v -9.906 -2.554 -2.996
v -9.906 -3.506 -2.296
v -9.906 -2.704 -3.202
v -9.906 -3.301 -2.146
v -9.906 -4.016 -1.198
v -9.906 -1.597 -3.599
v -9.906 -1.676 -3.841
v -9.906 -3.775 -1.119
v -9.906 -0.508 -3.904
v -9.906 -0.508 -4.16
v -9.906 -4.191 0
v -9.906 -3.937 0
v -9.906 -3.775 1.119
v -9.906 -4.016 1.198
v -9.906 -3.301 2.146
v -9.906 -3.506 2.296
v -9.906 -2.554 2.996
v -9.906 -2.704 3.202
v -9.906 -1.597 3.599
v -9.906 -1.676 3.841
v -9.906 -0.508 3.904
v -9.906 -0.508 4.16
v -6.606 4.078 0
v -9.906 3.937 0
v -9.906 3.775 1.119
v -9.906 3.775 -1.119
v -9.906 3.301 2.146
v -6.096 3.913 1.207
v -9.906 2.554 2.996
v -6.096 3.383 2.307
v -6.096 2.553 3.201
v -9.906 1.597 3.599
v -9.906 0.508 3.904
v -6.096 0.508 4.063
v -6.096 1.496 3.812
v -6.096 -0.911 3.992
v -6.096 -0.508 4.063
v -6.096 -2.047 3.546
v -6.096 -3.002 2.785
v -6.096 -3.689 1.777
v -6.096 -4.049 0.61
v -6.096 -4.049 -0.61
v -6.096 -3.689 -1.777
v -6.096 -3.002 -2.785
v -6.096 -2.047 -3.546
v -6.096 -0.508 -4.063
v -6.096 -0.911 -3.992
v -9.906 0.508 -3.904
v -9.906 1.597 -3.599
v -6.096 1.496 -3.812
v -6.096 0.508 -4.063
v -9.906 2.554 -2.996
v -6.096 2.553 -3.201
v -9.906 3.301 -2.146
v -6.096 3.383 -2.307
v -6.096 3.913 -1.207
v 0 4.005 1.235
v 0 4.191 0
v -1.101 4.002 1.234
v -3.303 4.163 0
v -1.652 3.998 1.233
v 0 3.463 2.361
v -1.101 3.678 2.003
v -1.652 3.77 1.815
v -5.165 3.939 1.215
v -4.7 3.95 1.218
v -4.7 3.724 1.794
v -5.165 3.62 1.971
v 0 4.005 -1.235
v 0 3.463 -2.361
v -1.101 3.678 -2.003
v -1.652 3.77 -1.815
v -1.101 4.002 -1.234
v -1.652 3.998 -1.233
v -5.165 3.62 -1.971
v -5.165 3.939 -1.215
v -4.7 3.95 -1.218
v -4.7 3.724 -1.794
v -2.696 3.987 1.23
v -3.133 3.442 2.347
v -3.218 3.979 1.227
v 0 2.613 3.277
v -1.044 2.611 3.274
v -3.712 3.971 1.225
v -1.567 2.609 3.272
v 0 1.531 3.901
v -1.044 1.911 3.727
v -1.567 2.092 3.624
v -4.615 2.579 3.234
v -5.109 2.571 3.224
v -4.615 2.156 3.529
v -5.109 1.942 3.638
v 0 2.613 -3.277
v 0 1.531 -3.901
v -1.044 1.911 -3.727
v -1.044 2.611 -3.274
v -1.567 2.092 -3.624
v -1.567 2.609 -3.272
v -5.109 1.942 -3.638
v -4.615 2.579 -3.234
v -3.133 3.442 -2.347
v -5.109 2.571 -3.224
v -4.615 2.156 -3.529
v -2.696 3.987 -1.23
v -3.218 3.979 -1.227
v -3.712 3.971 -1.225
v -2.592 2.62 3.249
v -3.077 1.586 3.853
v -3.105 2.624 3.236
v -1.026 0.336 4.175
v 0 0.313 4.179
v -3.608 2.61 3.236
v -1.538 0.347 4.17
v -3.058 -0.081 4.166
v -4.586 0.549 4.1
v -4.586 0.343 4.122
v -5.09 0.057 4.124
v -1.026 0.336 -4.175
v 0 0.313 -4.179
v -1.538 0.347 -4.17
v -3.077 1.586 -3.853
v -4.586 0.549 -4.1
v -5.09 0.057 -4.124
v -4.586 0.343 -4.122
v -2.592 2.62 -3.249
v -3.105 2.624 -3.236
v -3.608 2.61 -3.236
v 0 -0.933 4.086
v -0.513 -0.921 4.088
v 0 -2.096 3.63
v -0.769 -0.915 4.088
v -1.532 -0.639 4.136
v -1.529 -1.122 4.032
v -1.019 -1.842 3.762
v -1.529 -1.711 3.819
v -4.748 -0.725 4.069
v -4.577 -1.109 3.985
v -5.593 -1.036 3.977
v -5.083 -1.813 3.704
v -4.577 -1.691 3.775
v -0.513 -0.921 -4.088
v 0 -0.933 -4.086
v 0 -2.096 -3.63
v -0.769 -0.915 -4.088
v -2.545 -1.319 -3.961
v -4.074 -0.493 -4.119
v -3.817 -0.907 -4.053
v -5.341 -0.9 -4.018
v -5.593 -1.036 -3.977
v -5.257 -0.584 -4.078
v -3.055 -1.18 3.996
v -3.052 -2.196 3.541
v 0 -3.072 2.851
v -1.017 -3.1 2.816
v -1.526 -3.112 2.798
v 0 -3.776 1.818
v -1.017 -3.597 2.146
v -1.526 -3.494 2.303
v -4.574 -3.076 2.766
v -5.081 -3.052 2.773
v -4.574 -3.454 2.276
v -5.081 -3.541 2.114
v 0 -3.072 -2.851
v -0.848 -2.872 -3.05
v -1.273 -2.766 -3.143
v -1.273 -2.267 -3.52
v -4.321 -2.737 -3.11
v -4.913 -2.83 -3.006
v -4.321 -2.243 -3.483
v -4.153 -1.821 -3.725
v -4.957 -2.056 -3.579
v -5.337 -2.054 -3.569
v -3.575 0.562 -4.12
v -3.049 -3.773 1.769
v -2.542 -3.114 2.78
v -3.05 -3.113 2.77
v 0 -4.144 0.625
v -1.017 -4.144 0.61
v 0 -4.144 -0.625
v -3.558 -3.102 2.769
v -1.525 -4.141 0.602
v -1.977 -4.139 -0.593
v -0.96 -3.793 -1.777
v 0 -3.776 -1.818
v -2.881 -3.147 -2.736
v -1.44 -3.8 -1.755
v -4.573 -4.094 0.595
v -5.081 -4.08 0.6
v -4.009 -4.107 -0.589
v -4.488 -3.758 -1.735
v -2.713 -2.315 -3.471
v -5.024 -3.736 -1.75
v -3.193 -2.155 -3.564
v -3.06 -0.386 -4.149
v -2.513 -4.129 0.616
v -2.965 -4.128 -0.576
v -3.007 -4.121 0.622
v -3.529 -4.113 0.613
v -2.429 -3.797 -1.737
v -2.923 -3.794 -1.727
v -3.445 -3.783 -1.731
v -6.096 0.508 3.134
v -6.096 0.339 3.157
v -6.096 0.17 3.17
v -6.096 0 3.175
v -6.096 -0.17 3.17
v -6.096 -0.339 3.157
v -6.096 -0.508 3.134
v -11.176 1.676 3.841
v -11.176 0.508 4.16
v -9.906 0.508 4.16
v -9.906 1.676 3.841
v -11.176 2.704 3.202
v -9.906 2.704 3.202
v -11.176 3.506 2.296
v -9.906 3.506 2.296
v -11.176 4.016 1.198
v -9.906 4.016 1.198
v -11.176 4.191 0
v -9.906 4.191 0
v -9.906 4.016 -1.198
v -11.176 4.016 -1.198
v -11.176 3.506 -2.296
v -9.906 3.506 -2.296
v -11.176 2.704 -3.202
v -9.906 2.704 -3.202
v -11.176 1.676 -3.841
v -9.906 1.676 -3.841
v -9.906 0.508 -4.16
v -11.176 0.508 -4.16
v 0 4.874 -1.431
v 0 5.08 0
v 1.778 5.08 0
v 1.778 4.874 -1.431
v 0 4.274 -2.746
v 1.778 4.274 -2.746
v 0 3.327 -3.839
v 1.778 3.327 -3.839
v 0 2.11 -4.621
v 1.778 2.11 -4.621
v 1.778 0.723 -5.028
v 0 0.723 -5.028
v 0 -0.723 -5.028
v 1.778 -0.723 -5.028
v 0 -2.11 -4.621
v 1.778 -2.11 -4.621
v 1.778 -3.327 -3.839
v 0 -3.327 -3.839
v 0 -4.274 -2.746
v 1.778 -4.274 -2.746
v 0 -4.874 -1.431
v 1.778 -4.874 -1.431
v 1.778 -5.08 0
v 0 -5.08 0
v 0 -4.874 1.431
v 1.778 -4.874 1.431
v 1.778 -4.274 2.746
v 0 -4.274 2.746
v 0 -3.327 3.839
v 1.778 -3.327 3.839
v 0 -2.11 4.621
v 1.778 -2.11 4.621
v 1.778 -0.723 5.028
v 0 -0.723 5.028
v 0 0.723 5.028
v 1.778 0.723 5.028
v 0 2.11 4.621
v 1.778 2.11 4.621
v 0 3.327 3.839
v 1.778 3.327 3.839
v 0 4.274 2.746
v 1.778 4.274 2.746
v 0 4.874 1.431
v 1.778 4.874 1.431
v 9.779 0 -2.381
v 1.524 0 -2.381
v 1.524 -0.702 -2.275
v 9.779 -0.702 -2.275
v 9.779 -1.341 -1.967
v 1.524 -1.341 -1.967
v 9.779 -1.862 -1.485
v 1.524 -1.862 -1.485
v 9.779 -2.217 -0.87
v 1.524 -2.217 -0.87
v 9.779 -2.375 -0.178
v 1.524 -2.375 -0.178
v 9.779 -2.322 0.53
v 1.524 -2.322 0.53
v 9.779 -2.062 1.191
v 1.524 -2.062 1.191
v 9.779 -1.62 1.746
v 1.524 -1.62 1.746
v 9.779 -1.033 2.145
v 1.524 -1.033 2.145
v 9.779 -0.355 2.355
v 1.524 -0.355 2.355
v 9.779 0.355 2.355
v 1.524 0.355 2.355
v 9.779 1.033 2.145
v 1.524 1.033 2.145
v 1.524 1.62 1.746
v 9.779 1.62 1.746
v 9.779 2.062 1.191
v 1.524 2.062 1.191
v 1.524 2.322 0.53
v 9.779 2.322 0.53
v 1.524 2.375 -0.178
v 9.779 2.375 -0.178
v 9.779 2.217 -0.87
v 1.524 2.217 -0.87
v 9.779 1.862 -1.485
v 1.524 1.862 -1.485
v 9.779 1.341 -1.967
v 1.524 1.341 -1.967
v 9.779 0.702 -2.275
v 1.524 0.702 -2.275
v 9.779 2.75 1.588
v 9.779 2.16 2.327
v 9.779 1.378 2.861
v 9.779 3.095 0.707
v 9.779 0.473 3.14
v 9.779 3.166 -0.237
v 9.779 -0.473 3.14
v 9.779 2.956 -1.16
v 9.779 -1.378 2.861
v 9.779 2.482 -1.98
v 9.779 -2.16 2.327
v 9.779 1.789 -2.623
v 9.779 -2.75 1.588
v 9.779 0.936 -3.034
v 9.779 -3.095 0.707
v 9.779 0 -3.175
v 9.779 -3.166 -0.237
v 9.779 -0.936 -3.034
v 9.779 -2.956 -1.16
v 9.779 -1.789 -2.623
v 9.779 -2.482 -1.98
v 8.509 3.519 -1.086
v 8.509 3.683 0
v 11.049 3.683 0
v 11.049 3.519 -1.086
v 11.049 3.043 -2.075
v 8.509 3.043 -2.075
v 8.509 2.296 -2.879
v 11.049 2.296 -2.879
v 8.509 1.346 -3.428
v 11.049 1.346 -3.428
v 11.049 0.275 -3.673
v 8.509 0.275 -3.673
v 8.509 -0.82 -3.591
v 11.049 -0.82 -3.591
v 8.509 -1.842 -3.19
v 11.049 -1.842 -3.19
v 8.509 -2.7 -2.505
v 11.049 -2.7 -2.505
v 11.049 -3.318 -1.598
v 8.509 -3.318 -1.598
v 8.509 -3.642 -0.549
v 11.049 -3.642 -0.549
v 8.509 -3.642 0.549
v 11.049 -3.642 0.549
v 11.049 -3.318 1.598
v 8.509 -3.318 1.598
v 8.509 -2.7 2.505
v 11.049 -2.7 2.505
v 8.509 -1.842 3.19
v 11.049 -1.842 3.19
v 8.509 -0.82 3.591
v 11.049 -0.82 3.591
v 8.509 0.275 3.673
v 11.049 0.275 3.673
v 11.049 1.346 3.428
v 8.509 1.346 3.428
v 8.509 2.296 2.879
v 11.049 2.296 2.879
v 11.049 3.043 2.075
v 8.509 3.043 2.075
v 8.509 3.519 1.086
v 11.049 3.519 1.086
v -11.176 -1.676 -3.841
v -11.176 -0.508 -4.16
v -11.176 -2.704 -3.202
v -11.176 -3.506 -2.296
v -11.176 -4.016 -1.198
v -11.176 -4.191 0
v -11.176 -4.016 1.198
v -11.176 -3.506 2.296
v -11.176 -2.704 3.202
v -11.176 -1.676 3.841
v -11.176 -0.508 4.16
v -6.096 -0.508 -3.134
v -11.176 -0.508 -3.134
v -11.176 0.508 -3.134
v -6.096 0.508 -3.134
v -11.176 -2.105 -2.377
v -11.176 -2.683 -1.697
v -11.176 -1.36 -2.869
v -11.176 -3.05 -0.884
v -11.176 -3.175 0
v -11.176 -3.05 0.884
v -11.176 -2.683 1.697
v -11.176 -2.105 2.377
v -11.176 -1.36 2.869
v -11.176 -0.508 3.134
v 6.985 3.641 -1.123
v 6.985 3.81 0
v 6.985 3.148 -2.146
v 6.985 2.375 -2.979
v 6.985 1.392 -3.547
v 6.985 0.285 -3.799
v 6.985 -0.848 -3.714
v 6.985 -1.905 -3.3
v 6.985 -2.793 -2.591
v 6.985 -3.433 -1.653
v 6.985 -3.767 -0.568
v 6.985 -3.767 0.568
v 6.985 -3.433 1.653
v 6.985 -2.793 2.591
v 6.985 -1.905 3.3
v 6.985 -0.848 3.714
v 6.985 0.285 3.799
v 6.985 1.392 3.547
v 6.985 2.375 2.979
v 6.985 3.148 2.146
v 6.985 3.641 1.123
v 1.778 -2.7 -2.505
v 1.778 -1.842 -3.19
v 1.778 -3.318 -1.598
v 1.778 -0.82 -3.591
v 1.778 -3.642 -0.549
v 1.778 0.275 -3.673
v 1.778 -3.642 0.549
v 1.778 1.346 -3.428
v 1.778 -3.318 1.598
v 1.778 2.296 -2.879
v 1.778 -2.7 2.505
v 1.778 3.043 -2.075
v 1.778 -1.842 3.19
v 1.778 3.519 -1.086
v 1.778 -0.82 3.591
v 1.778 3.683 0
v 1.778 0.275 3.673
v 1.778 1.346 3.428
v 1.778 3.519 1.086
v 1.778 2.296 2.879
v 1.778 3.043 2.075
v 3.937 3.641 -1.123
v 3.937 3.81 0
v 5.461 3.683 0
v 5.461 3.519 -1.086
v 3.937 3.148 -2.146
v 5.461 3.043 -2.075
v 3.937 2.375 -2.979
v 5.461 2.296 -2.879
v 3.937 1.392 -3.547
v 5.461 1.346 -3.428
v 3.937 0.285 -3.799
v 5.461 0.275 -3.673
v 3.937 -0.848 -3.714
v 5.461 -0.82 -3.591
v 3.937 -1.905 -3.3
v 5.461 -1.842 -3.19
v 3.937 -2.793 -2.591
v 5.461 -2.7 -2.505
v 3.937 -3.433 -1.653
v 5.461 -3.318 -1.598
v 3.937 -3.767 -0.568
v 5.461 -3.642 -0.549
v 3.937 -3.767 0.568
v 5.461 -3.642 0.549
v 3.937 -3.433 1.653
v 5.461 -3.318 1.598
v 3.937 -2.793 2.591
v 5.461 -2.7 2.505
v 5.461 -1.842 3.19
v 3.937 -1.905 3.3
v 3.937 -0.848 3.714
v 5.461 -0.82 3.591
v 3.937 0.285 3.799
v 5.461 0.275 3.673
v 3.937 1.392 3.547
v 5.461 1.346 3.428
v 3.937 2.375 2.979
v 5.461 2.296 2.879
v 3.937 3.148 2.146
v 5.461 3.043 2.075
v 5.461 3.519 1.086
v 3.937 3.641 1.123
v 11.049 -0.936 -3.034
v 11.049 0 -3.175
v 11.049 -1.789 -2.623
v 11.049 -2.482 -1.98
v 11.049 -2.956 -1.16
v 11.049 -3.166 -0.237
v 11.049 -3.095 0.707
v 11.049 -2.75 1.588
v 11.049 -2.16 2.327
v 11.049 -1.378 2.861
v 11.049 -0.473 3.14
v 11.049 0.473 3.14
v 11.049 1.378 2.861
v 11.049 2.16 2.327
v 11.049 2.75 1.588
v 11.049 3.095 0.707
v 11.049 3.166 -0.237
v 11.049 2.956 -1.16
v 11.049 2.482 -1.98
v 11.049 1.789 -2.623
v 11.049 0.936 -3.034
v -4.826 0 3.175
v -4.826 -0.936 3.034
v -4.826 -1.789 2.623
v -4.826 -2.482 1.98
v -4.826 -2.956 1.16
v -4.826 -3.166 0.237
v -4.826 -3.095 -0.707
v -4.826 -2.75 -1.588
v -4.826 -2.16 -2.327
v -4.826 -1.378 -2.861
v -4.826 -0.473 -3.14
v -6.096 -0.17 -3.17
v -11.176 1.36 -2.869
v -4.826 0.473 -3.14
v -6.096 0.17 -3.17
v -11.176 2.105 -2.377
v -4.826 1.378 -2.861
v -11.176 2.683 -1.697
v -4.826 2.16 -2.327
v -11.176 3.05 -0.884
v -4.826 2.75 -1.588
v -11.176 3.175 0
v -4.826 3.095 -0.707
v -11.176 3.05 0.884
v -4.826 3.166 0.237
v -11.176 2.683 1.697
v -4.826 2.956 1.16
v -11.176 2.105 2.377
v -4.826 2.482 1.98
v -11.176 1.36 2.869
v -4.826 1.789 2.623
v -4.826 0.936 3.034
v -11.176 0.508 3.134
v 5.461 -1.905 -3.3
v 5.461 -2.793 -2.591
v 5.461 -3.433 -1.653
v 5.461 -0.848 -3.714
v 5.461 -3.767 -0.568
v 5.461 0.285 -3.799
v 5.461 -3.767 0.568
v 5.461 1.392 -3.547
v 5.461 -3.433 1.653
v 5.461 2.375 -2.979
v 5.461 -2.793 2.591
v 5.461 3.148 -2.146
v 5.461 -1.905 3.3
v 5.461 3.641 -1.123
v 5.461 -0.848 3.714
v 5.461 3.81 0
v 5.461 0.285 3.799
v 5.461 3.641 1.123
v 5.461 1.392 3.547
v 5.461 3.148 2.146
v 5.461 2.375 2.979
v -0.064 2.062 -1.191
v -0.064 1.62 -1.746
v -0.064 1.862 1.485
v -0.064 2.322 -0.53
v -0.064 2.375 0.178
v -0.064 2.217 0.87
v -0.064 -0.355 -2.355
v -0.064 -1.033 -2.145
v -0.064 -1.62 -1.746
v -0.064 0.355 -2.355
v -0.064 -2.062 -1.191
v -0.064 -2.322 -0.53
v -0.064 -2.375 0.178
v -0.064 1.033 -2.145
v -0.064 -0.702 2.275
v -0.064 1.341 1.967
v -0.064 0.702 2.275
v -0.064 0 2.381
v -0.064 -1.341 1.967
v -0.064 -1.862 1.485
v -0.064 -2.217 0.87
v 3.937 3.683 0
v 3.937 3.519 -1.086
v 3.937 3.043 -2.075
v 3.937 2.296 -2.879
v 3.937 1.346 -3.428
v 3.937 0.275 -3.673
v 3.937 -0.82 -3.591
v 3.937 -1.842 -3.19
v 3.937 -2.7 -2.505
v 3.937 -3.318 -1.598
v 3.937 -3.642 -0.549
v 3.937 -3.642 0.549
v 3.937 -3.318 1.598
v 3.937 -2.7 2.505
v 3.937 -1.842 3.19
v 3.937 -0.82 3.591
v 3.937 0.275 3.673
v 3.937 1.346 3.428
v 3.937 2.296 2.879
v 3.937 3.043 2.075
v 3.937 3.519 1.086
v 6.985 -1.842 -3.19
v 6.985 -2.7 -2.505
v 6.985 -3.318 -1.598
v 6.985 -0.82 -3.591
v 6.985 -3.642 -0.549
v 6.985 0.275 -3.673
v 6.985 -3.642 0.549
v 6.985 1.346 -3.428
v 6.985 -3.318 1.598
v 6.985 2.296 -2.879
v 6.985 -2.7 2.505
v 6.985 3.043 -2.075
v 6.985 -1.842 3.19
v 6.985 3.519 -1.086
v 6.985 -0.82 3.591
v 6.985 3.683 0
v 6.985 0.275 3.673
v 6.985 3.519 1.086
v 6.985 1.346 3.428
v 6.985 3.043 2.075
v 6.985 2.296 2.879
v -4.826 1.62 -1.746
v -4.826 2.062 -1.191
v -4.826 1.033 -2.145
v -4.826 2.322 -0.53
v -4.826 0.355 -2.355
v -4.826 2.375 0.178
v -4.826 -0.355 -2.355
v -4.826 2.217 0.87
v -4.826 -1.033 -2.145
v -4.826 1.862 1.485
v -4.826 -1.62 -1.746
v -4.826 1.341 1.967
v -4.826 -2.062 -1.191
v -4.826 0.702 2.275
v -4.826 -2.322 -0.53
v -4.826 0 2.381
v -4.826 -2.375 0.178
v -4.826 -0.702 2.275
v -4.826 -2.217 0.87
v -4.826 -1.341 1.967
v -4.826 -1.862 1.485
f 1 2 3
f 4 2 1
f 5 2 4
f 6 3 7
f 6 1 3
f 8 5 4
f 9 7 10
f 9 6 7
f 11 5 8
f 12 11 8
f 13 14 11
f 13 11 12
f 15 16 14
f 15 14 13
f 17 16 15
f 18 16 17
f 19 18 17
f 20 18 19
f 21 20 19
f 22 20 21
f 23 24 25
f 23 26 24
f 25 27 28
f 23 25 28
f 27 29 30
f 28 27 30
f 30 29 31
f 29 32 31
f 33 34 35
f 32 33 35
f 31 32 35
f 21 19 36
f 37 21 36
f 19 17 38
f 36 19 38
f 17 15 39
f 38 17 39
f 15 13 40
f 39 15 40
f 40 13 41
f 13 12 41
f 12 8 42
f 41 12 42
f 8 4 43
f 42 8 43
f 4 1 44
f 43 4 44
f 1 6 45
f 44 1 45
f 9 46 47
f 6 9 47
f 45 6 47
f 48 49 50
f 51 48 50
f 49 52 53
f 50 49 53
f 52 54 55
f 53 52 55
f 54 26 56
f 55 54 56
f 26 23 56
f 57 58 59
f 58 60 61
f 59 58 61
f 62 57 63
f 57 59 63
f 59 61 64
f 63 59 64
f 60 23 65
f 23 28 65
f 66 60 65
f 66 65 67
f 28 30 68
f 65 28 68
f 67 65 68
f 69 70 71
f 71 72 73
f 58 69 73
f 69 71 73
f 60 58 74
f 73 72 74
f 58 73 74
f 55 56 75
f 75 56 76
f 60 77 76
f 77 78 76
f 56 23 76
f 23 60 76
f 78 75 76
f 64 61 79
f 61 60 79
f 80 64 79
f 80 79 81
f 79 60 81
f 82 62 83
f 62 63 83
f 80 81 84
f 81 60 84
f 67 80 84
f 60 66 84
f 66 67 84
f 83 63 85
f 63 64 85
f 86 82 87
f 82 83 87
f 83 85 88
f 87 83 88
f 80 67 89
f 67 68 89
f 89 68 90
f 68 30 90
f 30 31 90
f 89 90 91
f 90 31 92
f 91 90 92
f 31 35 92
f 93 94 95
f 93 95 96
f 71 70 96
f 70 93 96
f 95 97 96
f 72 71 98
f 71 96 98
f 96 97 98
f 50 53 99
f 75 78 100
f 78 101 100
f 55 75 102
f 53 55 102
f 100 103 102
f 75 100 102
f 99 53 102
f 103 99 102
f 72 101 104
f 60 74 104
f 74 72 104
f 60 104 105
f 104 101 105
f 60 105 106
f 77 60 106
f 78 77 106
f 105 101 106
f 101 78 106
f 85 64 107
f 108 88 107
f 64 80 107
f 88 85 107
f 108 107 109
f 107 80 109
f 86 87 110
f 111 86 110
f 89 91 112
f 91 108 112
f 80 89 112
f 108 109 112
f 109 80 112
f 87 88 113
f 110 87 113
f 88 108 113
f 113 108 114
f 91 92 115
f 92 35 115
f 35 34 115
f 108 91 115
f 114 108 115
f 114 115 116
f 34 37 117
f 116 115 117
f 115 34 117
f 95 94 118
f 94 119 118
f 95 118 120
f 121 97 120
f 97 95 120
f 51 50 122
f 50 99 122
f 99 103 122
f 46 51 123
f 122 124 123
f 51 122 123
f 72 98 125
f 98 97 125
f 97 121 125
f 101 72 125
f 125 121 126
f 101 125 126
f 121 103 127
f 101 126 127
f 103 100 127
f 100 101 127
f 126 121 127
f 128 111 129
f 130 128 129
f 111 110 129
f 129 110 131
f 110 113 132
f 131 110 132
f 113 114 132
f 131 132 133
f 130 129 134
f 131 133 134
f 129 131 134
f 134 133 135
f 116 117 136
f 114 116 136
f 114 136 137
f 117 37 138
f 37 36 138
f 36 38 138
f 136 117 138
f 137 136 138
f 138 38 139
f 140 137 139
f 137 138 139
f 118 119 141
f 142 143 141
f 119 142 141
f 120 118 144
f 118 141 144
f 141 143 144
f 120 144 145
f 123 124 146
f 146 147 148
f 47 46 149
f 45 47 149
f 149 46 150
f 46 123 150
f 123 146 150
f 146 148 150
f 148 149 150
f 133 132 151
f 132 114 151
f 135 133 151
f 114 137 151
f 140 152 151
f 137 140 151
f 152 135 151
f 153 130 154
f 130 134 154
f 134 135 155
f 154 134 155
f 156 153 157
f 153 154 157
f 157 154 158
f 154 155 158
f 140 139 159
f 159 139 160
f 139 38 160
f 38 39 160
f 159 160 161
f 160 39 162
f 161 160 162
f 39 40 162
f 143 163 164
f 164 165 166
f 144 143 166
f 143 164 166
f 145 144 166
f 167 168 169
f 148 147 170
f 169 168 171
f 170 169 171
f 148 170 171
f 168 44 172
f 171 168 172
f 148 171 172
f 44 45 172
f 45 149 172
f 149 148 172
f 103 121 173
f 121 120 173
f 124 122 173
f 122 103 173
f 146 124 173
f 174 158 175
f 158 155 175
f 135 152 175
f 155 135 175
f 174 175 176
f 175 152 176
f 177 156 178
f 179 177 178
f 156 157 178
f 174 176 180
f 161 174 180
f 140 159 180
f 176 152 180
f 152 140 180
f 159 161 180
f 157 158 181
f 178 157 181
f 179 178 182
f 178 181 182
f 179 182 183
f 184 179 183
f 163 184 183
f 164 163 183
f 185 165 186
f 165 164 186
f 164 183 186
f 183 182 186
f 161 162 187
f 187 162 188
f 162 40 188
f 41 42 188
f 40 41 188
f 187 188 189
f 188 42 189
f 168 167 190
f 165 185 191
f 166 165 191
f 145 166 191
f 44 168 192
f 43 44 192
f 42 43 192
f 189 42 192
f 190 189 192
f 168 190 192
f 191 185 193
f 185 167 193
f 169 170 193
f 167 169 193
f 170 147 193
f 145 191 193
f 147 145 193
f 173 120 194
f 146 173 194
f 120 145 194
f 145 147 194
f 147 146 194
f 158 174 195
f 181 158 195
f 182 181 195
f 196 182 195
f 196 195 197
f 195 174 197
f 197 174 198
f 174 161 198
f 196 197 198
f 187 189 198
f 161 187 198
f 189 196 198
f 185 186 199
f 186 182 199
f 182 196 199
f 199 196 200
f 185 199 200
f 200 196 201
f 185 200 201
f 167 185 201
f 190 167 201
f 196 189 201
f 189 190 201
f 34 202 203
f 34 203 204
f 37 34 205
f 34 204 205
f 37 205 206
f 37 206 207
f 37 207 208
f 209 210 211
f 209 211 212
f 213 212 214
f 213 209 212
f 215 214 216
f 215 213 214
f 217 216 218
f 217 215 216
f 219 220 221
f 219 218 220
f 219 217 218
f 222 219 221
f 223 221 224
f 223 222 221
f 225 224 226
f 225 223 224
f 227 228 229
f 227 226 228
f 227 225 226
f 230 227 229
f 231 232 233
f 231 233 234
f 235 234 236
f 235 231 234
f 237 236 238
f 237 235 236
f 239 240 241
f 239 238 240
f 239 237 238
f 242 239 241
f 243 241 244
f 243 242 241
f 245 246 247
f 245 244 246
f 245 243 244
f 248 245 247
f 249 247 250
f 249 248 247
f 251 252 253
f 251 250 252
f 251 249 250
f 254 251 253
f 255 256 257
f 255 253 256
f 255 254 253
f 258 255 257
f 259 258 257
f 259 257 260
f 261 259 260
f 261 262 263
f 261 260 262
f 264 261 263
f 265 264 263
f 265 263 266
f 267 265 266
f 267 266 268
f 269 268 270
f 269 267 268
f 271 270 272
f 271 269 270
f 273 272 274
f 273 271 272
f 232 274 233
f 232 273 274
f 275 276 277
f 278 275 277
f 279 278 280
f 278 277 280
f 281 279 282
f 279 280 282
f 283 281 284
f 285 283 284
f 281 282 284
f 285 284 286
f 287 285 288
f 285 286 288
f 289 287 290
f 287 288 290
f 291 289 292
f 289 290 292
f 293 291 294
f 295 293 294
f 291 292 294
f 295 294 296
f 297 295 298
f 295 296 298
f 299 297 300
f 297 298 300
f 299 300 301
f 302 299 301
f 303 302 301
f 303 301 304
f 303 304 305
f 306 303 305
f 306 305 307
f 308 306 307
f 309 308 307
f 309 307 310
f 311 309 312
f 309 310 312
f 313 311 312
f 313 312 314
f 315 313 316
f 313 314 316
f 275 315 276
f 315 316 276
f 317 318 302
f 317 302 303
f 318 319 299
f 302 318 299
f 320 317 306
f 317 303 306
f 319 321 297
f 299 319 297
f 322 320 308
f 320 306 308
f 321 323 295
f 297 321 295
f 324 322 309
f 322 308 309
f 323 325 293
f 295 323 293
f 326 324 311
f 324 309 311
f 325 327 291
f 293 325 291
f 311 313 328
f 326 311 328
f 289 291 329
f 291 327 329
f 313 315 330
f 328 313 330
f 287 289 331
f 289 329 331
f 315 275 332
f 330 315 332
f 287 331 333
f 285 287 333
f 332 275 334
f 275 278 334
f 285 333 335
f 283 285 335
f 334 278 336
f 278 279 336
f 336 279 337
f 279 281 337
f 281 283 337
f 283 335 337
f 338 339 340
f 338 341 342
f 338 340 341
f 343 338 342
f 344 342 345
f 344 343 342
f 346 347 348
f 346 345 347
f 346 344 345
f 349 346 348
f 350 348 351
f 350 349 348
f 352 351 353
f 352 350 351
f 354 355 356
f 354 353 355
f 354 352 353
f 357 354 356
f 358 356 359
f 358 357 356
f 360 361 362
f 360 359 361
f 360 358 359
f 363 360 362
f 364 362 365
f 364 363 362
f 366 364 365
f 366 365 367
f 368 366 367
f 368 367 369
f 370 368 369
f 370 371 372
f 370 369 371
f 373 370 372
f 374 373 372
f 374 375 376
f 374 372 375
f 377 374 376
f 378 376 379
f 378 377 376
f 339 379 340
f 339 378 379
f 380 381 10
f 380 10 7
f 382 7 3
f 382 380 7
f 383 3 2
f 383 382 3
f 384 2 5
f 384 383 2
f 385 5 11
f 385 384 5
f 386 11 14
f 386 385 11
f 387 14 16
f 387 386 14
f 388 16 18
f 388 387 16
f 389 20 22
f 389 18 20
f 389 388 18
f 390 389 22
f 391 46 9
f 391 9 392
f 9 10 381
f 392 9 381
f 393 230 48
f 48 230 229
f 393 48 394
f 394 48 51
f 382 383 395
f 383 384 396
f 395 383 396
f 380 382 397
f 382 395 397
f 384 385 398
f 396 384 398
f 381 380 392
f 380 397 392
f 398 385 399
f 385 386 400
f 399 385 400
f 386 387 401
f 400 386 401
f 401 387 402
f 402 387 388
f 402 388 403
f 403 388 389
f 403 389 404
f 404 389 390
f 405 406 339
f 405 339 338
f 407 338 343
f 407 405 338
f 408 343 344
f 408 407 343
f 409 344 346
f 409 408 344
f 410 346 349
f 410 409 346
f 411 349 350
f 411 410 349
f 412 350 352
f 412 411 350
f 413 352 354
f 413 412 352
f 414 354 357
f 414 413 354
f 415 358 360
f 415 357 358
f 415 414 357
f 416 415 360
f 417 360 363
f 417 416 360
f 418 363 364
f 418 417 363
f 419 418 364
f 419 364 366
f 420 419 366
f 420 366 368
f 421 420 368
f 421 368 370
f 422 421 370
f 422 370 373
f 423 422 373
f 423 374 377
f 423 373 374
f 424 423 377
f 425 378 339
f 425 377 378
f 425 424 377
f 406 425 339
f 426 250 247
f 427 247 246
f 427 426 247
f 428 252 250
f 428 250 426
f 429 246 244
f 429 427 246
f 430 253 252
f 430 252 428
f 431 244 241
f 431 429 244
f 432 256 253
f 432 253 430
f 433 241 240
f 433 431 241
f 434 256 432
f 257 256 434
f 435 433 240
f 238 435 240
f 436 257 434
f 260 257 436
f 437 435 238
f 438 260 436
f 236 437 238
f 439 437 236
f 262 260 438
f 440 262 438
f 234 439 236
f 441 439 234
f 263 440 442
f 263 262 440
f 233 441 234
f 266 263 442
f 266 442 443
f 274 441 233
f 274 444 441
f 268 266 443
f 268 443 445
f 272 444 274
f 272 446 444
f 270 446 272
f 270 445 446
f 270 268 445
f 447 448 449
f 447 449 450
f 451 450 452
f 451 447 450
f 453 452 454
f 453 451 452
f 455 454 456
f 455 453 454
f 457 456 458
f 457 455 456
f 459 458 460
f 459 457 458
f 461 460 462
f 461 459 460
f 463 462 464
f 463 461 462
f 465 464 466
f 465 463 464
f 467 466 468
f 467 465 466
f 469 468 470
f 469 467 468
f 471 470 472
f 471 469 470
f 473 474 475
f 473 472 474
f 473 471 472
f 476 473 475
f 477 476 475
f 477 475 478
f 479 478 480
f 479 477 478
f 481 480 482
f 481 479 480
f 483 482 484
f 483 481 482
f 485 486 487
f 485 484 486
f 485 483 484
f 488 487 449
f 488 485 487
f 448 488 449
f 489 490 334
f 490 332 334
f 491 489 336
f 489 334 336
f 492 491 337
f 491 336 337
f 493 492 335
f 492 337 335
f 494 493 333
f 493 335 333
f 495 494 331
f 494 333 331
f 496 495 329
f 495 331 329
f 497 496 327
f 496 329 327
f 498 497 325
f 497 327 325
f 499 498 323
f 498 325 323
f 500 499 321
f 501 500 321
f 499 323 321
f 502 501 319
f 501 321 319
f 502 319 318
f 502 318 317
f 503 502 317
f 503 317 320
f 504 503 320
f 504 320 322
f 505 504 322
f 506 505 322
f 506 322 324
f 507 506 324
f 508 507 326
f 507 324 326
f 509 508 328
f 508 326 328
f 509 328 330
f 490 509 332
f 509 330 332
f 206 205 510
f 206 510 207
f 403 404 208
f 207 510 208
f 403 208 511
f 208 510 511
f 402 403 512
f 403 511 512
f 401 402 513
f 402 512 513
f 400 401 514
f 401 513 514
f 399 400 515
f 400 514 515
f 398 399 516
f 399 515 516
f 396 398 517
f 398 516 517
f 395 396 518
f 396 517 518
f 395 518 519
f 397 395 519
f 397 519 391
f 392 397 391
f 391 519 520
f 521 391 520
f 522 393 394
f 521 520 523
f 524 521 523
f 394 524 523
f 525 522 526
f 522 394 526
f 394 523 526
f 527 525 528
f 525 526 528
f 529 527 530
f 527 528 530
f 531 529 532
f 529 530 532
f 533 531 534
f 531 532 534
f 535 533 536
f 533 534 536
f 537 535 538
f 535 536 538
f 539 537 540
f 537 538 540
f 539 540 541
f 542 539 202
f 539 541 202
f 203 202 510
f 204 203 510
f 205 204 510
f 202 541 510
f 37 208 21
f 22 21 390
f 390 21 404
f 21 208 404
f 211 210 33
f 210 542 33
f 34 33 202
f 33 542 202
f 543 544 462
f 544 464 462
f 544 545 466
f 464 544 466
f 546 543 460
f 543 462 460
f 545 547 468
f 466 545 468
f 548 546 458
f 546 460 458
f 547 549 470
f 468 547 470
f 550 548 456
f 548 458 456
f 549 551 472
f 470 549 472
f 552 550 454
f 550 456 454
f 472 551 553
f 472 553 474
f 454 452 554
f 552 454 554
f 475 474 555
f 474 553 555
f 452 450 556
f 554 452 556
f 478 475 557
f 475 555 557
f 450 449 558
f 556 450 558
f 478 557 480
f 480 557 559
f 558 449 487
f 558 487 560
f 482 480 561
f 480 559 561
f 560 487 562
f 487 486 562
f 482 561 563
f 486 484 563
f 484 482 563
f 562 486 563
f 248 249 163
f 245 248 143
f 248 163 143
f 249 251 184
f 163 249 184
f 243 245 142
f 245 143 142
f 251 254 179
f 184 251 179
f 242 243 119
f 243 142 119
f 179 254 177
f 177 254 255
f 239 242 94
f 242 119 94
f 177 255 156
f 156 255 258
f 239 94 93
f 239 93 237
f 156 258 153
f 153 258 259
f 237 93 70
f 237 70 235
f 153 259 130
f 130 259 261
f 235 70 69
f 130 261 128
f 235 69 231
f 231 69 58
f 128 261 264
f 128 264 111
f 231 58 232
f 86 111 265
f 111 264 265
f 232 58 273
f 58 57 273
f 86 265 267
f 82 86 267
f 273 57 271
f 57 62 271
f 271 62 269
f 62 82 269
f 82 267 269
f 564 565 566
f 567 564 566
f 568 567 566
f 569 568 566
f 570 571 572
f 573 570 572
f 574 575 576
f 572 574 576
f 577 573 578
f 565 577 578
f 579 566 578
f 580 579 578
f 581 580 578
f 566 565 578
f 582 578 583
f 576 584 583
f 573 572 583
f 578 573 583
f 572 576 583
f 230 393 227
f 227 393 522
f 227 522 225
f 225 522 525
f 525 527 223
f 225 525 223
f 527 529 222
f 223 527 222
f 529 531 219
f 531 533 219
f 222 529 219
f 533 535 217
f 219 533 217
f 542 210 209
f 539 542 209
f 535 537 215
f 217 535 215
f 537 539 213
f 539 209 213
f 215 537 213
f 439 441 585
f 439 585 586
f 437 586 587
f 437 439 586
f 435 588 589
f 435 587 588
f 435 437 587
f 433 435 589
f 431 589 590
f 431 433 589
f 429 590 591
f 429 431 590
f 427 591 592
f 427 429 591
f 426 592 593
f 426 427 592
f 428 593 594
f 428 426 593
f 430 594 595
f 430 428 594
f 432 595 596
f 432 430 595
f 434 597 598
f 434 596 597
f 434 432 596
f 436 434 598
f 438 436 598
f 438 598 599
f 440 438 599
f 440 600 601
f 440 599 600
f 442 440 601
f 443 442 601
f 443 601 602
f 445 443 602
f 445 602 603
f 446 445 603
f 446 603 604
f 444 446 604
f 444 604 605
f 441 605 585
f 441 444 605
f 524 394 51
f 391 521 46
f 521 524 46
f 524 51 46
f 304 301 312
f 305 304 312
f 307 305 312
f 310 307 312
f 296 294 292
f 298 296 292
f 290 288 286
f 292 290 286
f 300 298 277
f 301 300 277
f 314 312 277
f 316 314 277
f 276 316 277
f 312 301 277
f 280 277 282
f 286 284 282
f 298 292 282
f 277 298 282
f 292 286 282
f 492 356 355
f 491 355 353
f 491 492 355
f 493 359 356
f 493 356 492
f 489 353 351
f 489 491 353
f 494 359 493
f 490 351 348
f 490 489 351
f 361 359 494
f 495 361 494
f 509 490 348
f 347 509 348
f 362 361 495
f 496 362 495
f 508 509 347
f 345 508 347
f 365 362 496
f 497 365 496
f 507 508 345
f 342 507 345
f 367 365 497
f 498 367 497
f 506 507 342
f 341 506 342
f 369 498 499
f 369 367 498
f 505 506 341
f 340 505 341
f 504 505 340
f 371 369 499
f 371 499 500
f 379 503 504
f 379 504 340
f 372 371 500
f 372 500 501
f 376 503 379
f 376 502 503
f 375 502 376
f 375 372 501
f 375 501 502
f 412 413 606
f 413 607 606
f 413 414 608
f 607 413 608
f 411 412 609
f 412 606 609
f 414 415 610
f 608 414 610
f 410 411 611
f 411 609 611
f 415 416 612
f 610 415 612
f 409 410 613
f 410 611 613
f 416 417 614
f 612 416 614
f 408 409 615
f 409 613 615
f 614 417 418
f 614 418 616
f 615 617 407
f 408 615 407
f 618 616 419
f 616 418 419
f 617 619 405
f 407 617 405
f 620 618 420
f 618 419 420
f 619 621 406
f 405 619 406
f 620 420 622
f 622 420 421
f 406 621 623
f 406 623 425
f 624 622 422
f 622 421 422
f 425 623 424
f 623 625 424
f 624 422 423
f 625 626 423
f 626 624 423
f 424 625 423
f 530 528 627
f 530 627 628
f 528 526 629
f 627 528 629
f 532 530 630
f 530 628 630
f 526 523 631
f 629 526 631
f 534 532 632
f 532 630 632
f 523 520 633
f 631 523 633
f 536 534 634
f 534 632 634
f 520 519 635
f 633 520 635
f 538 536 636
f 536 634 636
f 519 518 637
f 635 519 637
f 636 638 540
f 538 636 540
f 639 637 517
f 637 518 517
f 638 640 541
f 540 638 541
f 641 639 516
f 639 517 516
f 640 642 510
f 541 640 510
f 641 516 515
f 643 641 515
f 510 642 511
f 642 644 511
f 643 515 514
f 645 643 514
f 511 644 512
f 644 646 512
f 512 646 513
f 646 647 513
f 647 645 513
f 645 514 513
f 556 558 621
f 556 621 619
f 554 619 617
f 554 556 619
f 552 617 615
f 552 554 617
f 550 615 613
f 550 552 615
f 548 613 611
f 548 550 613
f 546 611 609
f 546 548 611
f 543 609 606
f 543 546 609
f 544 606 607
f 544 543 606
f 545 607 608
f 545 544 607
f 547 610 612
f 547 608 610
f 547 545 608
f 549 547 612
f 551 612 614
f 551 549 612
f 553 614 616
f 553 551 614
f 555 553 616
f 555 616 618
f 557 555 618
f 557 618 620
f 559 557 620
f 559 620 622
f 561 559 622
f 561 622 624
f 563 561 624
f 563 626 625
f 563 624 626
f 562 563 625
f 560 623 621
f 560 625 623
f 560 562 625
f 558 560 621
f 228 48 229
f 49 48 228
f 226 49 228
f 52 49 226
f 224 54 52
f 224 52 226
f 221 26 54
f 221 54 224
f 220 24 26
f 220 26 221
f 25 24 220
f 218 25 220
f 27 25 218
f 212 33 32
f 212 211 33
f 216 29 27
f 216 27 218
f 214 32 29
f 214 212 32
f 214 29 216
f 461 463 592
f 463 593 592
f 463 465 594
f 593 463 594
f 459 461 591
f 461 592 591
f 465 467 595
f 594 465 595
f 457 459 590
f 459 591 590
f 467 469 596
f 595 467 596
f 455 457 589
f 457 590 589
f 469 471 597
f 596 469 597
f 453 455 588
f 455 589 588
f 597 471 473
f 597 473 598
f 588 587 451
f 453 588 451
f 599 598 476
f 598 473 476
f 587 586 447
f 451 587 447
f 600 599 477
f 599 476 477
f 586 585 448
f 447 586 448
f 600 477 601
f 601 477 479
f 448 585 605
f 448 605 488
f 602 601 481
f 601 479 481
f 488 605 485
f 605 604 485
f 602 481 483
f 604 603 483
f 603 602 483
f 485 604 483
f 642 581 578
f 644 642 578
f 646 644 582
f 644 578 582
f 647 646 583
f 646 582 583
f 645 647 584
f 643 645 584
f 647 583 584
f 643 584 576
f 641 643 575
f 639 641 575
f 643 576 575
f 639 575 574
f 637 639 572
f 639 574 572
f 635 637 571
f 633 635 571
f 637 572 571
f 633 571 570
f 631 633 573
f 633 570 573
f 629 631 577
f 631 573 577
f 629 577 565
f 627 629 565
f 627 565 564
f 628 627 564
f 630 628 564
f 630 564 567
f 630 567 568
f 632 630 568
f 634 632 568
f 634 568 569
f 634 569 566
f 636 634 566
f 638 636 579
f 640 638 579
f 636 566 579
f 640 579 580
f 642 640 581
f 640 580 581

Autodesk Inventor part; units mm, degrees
ref_plane "YZ Plane" through (0, 0, 0) normal (1, 0, 0) x (0, 1, 0)
ref_plane "XZ Plane" through (0, 0, 0) normal (0, 1, 0) x (-1, 0, 0)
ref_plane "XY Plane" through (0, 0, 0) normal (0, 0, 1) x (1, 0, 0)
sketch "Sketch1" plane through (0, 0, 0) normal (0, 0, 1) x (1, 0, 0)
  line L0 (0, 0) -> (1.778, 0)
  line L1 (1.778, 0) -> (1.778, 5.08)
  line L2 (1.778, 5.08) -> (0, 5.08)
  line L3 (0, 5.08) -> (0, 0)
  line L4 (1.778, 0) -> (11.049, 0)
  line L5 (11.049, 0) -> (11.049, 3.683)
  line L6 (11.049, 3.683) -> (1.778, 3.683)
  line L7 (1.778, 3.683) -> (1.778, 0)
  line L8 (8.509, 3.683) -> (6.985, 3.81)
  line L9 (6.985, 3.81) -> (6.985, 3.683)
  line L10 (6.985, 3.683) -> (5.461, 3.81)
  line L11 (5.461, 3.81) -> (5.461, 3.683)
  line L12 (5.461, 3.683) -> (3.937, 3.81)
  line L13 (3.937, 3.81) -> (3.937, 3.683)
  line L14 (0, 0) -> (0, 3.1252)
  line L15 (0, 4.191) -> (0.889, 4.191) construction
  line L16 (0, 4.191) -> (0, 0)
  arc A0 (0, 4.191) -> (-9.906, 3.937) centre (0, -189.103) ccw
  line L17 (-9.906, 3.937) -> (-9.906, 4.191)
  line L18 (-9.906, 4.191) -> (-11.176, 4.191)
  line L19 (-11.176, 4.191) -> (-11.176, 0)
  line L20 (-11.176, 0) -> (0, 0)
  dimension "d0" = 1.778
  dimension "d1" = 10.16
  dimension "d2" = 9.271
  dimension "d3" = 7.366
  dimension "d4" = 7.62
  dimension "d5" = 2.54
  dimension "d6" = 1.524
  dimension "d7" = 8.382
  dimension "d8" = 8.382
  dimension "d9" = 11.176
  dimension "d10" = 7.874
  dimension "d11" = 1.27
revolve "Revolution1" add sketch "Sketch1" angle 360 about axis through (-11.176, 0, 0) along (1, 0, 0)
sketch "Sketch2" plane through (0, 0, 0) normal (0, 0, 1) x (1, 0, 0)
  line L0 (-11.176, 0.508) -> (-6.096, 0.508)
  line L1 (-6.096, 0.508) -> (-6.096, -0.508)
  line L2 (-6.096, -0.508) -> (-11.176, -0.508)
  line L3 (-11.176, -0.508) -> (-11.176, 0.508)
  line L4 (-11.176, -4.191) -> (-11.176, 4.191) construction
  point P0 (0, 0)
  point P1 (-11.176, 0)
  dimension "d13" = 1.016
  dimension "d14" = 5.08
extrude "Extrusion1" cut sketch "Sketch2" along normal through all both and the other way through all
hole "Hole1" at (-11.176, 0, 0) direction (1, 0, 0) diameter 4.7625 depth 11.1125 counterbore diameter 6.35 counterbore depth 6.35
hole "Hole2" at (11.049, 0, 0) direction (-1, 0, 0) diameter 4.7625 depth 9.525 counterbore diameter 6.35 counterbore depth 1.27
equation "\"d8\" = d7"
properties part number "T9 Axle"
